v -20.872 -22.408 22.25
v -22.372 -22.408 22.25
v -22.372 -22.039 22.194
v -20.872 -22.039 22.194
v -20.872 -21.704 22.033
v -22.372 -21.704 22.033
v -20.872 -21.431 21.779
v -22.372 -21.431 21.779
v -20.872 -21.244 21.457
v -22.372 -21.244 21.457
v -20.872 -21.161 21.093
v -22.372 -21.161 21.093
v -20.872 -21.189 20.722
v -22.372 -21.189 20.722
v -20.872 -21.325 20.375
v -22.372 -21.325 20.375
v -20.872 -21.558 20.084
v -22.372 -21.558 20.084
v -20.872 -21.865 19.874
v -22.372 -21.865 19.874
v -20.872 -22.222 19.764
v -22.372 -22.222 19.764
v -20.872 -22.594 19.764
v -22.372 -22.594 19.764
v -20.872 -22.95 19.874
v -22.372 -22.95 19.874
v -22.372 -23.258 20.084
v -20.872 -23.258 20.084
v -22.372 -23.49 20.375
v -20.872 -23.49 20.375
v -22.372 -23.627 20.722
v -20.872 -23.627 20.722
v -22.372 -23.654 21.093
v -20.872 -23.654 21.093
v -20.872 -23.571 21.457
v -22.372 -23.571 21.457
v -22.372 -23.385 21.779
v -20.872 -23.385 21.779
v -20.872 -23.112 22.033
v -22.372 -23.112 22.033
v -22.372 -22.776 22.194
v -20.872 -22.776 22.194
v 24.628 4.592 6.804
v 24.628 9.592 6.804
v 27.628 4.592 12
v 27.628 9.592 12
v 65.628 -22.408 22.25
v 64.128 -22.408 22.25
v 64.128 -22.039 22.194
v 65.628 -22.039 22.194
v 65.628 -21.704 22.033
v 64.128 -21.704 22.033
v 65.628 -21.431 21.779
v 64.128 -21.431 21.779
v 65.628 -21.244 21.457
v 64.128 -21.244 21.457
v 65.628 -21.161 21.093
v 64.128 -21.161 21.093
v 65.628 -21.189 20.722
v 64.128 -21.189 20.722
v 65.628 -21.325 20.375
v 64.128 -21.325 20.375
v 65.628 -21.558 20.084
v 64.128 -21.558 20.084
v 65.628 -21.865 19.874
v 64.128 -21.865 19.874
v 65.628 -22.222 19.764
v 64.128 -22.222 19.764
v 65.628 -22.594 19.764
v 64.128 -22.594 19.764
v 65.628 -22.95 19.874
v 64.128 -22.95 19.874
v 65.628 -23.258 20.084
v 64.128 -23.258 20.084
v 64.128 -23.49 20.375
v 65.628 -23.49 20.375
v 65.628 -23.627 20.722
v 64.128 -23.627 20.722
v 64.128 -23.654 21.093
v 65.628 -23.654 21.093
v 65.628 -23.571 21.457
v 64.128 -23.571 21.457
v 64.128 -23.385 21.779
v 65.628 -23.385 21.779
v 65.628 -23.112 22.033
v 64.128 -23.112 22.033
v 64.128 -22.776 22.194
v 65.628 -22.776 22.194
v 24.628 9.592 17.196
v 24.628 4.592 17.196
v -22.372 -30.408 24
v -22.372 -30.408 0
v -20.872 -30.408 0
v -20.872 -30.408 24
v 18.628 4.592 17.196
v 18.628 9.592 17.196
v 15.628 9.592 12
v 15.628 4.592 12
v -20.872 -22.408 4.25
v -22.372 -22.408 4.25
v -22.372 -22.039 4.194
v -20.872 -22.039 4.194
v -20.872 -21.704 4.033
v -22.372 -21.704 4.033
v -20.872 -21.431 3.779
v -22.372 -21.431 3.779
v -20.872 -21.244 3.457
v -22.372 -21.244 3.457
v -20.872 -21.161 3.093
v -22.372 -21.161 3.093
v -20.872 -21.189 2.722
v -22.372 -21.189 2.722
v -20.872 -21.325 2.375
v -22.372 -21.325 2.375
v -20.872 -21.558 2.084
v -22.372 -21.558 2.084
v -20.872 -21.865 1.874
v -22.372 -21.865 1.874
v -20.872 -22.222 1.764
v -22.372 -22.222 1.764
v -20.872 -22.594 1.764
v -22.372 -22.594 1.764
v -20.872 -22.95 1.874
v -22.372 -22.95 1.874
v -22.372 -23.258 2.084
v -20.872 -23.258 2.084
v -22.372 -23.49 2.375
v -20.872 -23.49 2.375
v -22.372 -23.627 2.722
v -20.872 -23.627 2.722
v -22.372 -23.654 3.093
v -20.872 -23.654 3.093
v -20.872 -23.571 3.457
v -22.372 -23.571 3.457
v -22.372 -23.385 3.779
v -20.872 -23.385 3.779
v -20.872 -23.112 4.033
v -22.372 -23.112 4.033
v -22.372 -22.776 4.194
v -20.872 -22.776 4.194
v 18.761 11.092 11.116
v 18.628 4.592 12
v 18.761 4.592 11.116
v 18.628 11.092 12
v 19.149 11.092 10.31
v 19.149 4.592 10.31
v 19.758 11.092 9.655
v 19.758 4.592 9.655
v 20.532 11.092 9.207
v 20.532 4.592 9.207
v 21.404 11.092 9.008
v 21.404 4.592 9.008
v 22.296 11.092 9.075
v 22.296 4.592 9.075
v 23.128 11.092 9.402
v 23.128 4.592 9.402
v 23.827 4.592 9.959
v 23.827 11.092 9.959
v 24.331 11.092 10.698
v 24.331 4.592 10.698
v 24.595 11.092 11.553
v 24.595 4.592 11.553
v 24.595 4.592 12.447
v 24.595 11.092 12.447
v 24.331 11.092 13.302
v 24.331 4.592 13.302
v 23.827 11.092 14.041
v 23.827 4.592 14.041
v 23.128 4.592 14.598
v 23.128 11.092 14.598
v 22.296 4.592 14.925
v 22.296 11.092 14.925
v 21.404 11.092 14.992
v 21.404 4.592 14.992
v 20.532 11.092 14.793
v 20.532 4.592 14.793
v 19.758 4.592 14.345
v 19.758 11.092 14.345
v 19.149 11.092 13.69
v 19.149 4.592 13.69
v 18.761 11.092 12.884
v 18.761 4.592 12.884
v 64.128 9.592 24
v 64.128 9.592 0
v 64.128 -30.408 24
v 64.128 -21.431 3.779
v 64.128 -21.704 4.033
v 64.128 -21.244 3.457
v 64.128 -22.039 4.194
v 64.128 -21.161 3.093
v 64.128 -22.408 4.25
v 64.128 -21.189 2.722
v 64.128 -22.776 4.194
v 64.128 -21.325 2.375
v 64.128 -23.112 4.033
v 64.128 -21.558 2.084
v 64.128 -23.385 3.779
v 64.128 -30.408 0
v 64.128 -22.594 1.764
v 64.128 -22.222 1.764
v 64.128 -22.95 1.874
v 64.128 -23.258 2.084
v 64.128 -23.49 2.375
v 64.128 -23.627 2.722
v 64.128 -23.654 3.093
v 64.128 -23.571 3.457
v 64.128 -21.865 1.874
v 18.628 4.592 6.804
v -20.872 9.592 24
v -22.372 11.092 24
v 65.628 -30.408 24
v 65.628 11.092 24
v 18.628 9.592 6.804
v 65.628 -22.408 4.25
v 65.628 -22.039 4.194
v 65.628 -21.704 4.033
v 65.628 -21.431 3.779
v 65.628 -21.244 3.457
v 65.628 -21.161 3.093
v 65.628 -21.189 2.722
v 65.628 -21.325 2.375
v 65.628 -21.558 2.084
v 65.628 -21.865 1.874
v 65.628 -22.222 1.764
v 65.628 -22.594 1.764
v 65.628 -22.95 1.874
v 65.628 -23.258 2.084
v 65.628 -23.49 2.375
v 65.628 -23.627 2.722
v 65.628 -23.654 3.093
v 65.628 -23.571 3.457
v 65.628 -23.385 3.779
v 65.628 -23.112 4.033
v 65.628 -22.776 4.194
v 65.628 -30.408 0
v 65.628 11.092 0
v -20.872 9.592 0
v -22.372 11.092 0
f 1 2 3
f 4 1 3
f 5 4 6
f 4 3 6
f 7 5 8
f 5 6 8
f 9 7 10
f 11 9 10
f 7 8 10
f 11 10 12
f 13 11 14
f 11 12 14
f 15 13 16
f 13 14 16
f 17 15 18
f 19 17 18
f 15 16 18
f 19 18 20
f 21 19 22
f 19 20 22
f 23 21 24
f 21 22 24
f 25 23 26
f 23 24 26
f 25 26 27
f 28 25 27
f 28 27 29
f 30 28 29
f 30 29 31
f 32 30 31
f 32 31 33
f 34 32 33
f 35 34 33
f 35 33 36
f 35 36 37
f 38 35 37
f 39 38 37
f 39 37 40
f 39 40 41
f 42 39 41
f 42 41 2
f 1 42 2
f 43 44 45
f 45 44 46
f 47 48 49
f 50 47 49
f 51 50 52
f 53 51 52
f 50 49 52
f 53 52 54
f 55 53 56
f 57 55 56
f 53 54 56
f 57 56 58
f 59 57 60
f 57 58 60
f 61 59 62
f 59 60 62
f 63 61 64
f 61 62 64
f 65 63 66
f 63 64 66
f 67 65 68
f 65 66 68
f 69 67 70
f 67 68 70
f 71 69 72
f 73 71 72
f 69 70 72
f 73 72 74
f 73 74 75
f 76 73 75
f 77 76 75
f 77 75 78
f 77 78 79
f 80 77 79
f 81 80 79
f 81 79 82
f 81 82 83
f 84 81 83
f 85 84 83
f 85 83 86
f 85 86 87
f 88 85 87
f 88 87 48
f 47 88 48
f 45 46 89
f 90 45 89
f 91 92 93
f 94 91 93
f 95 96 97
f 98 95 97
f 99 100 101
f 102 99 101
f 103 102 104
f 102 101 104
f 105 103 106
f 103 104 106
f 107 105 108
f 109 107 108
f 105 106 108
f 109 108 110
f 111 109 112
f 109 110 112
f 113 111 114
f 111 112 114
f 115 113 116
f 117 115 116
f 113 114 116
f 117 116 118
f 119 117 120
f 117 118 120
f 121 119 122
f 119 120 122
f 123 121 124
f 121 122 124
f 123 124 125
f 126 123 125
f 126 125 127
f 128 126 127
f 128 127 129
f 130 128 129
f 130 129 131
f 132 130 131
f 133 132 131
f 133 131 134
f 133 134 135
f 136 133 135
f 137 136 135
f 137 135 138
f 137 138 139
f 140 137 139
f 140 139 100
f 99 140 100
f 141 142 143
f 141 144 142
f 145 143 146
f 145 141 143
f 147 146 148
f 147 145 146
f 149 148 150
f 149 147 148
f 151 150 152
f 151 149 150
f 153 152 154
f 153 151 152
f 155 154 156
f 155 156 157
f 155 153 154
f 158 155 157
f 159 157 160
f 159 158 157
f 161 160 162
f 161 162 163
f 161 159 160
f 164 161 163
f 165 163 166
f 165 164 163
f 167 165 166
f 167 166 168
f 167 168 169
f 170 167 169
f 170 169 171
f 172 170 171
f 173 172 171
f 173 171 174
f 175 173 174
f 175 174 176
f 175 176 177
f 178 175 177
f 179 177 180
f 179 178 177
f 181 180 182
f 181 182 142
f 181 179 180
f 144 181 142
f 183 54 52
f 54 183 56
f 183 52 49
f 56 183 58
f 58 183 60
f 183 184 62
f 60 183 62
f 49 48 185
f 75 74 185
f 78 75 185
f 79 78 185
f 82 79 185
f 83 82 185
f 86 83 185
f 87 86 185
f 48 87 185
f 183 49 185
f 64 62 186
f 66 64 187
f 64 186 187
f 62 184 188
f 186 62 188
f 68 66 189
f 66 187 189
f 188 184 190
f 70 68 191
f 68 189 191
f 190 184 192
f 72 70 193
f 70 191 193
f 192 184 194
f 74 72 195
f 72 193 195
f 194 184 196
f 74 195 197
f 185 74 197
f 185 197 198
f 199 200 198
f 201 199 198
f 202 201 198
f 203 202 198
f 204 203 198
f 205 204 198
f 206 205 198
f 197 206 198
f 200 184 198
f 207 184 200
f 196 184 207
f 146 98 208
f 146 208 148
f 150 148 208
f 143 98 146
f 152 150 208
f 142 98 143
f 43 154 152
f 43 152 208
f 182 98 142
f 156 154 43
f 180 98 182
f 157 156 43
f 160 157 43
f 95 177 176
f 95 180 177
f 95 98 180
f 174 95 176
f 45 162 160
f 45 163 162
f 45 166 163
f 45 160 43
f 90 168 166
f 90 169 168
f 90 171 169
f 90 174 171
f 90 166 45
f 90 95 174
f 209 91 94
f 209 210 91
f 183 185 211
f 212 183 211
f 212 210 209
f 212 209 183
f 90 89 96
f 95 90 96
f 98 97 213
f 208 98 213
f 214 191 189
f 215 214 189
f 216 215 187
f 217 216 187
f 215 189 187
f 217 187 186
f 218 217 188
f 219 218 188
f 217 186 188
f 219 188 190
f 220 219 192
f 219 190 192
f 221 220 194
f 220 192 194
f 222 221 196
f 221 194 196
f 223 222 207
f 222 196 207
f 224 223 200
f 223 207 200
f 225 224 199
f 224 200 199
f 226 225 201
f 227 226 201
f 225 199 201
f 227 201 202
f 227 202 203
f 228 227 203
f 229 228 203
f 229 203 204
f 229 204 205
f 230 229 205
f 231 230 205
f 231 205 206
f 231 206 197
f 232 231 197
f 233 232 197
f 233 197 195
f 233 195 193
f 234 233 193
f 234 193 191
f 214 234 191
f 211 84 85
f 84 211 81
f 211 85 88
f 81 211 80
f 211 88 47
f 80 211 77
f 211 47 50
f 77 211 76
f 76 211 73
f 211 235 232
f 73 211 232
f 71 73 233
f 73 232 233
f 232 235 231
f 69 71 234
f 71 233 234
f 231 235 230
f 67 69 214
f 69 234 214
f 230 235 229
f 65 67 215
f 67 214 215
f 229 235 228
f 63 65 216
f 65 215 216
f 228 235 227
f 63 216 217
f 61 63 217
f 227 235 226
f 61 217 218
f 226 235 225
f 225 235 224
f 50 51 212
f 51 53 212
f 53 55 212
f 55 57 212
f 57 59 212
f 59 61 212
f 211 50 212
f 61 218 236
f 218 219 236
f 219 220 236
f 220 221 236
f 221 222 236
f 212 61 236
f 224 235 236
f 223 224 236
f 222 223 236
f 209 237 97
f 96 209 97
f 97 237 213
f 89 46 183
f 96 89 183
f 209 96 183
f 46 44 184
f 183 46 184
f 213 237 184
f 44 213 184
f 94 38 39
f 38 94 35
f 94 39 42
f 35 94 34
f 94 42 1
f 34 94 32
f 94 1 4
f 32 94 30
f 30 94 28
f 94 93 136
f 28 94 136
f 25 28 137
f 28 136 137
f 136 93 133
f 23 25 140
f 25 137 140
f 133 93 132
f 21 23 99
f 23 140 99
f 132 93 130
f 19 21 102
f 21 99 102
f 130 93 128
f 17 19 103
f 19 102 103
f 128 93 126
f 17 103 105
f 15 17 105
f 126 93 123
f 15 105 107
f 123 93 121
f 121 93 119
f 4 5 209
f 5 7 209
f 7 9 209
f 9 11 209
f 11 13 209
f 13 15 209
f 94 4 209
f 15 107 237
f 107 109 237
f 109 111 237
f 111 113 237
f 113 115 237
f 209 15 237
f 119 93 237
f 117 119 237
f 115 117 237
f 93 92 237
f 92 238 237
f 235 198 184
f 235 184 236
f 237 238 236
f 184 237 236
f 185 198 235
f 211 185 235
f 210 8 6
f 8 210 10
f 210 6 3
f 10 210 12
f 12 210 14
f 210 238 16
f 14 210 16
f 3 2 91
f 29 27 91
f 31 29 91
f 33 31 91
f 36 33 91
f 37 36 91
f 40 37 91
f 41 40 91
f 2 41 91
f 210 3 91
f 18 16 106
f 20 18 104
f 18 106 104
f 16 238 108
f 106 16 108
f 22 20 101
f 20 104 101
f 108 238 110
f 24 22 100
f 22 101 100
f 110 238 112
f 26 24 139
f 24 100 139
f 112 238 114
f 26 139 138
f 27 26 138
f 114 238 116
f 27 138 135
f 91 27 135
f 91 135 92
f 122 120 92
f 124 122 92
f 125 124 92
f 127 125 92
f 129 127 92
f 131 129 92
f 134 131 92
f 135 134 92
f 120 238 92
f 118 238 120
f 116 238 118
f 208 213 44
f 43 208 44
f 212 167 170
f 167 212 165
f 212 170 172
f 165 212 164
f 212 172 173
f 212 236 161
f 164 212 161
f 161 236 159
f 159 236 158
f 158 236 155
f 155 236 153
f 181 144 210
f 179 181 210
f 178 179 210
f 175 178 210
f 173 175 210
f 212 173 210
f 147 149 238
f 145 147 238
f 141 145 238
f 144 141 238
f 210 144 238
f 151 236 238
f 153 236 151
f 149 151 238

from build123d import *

# Parameters (mm, degrees)
BOSS_EXTRUDE1_DEPTH = 24
SKETCH2_R           = 1.25
CUT_EXTRUDE1_DEPTH  = 90
CUT_EXTRUDE2_REACH  = 83.273
SKETCH3_R           = 3
SKETCH4_R           = 3
BOSS_EXTRUDE2_DEPTH = 5


with BuildPart() as part:
    # Sketch1 → Boss-Extrude1 (new body)
    with BuildSketch(Plane.XY):
        Polygon((-22.371784864, -30.407843619), (-20.871784864, -30.407843619), (-20.871784864, 9.592156381), (64.128215136, 9.592156381), (64.128215136, -30.407843619), (65.628215136, -30.407843619), (65.628215136, 11.092156381), (-22.371784864, 11.092156381), align=None)
    extrude(amount=BOSS_EXTRUDE1_DEPTH)

    # Sketch2 → Cut-Extrude1 (cut)
    with BuildSketch(Plane.ZY.offset(22.371784864)):
        with Locations((3, -22.407843619)):
            Circle(SKETCH2_R)
        with Locations((21, -22.407843619)):
            Circle(SKETCH2_R)
    extrude(amount=-CUT_EXTRUDE1_DEPTH, mode=Mode.SUBTRACT)

    # Sketch3 → Cut-Extrude2 (cut, up to next)
    with BuildSketch(Plane(origin=(0, 11.092156381, 0), x_dir=(1, 0, 0), z_dir=(0, 1, 0)), mode=Mode.PRIVATE) as cut_extrude2_sk1:
        with Locations(Location((21.628215136, -12, 0), (0, 0, 180))):
            Circle(SKETCH3_R)
    cut_extrude2_tool1 = extrude(cut_extrude2_sk1.sketch, amount=-CUT_EXTRUDE2_REACH, mode=Mode.PRIVATE) & part.part
    add(cut_extrude2_tool1.solids().sort_by_distance((21.628215, 11.092156, 12))[0], mode=Mode.SUBTRACT)

    # Sketch4 → Boss-Extrude2 (add)
    with BuildSketch(Plane.XZ.offset(-9.592156381)):
        Polygon((18.628215136, 6.803847577), (24.628215136, 6.803847577), (27.628215136, 12), (24.628215136, 17.196152423), (18.628215136, 17.196152423), (15.628215136, 12), align=None)
        with Locations(Location((21.628215136, 12, 0), (0, 0, 180))):
            Circle(SKETCH4_R, mode=Mode.SUBTRACT)
    extrude(amount=BOSS_EXTRUDE2_DEPTH)


solid = part.part
